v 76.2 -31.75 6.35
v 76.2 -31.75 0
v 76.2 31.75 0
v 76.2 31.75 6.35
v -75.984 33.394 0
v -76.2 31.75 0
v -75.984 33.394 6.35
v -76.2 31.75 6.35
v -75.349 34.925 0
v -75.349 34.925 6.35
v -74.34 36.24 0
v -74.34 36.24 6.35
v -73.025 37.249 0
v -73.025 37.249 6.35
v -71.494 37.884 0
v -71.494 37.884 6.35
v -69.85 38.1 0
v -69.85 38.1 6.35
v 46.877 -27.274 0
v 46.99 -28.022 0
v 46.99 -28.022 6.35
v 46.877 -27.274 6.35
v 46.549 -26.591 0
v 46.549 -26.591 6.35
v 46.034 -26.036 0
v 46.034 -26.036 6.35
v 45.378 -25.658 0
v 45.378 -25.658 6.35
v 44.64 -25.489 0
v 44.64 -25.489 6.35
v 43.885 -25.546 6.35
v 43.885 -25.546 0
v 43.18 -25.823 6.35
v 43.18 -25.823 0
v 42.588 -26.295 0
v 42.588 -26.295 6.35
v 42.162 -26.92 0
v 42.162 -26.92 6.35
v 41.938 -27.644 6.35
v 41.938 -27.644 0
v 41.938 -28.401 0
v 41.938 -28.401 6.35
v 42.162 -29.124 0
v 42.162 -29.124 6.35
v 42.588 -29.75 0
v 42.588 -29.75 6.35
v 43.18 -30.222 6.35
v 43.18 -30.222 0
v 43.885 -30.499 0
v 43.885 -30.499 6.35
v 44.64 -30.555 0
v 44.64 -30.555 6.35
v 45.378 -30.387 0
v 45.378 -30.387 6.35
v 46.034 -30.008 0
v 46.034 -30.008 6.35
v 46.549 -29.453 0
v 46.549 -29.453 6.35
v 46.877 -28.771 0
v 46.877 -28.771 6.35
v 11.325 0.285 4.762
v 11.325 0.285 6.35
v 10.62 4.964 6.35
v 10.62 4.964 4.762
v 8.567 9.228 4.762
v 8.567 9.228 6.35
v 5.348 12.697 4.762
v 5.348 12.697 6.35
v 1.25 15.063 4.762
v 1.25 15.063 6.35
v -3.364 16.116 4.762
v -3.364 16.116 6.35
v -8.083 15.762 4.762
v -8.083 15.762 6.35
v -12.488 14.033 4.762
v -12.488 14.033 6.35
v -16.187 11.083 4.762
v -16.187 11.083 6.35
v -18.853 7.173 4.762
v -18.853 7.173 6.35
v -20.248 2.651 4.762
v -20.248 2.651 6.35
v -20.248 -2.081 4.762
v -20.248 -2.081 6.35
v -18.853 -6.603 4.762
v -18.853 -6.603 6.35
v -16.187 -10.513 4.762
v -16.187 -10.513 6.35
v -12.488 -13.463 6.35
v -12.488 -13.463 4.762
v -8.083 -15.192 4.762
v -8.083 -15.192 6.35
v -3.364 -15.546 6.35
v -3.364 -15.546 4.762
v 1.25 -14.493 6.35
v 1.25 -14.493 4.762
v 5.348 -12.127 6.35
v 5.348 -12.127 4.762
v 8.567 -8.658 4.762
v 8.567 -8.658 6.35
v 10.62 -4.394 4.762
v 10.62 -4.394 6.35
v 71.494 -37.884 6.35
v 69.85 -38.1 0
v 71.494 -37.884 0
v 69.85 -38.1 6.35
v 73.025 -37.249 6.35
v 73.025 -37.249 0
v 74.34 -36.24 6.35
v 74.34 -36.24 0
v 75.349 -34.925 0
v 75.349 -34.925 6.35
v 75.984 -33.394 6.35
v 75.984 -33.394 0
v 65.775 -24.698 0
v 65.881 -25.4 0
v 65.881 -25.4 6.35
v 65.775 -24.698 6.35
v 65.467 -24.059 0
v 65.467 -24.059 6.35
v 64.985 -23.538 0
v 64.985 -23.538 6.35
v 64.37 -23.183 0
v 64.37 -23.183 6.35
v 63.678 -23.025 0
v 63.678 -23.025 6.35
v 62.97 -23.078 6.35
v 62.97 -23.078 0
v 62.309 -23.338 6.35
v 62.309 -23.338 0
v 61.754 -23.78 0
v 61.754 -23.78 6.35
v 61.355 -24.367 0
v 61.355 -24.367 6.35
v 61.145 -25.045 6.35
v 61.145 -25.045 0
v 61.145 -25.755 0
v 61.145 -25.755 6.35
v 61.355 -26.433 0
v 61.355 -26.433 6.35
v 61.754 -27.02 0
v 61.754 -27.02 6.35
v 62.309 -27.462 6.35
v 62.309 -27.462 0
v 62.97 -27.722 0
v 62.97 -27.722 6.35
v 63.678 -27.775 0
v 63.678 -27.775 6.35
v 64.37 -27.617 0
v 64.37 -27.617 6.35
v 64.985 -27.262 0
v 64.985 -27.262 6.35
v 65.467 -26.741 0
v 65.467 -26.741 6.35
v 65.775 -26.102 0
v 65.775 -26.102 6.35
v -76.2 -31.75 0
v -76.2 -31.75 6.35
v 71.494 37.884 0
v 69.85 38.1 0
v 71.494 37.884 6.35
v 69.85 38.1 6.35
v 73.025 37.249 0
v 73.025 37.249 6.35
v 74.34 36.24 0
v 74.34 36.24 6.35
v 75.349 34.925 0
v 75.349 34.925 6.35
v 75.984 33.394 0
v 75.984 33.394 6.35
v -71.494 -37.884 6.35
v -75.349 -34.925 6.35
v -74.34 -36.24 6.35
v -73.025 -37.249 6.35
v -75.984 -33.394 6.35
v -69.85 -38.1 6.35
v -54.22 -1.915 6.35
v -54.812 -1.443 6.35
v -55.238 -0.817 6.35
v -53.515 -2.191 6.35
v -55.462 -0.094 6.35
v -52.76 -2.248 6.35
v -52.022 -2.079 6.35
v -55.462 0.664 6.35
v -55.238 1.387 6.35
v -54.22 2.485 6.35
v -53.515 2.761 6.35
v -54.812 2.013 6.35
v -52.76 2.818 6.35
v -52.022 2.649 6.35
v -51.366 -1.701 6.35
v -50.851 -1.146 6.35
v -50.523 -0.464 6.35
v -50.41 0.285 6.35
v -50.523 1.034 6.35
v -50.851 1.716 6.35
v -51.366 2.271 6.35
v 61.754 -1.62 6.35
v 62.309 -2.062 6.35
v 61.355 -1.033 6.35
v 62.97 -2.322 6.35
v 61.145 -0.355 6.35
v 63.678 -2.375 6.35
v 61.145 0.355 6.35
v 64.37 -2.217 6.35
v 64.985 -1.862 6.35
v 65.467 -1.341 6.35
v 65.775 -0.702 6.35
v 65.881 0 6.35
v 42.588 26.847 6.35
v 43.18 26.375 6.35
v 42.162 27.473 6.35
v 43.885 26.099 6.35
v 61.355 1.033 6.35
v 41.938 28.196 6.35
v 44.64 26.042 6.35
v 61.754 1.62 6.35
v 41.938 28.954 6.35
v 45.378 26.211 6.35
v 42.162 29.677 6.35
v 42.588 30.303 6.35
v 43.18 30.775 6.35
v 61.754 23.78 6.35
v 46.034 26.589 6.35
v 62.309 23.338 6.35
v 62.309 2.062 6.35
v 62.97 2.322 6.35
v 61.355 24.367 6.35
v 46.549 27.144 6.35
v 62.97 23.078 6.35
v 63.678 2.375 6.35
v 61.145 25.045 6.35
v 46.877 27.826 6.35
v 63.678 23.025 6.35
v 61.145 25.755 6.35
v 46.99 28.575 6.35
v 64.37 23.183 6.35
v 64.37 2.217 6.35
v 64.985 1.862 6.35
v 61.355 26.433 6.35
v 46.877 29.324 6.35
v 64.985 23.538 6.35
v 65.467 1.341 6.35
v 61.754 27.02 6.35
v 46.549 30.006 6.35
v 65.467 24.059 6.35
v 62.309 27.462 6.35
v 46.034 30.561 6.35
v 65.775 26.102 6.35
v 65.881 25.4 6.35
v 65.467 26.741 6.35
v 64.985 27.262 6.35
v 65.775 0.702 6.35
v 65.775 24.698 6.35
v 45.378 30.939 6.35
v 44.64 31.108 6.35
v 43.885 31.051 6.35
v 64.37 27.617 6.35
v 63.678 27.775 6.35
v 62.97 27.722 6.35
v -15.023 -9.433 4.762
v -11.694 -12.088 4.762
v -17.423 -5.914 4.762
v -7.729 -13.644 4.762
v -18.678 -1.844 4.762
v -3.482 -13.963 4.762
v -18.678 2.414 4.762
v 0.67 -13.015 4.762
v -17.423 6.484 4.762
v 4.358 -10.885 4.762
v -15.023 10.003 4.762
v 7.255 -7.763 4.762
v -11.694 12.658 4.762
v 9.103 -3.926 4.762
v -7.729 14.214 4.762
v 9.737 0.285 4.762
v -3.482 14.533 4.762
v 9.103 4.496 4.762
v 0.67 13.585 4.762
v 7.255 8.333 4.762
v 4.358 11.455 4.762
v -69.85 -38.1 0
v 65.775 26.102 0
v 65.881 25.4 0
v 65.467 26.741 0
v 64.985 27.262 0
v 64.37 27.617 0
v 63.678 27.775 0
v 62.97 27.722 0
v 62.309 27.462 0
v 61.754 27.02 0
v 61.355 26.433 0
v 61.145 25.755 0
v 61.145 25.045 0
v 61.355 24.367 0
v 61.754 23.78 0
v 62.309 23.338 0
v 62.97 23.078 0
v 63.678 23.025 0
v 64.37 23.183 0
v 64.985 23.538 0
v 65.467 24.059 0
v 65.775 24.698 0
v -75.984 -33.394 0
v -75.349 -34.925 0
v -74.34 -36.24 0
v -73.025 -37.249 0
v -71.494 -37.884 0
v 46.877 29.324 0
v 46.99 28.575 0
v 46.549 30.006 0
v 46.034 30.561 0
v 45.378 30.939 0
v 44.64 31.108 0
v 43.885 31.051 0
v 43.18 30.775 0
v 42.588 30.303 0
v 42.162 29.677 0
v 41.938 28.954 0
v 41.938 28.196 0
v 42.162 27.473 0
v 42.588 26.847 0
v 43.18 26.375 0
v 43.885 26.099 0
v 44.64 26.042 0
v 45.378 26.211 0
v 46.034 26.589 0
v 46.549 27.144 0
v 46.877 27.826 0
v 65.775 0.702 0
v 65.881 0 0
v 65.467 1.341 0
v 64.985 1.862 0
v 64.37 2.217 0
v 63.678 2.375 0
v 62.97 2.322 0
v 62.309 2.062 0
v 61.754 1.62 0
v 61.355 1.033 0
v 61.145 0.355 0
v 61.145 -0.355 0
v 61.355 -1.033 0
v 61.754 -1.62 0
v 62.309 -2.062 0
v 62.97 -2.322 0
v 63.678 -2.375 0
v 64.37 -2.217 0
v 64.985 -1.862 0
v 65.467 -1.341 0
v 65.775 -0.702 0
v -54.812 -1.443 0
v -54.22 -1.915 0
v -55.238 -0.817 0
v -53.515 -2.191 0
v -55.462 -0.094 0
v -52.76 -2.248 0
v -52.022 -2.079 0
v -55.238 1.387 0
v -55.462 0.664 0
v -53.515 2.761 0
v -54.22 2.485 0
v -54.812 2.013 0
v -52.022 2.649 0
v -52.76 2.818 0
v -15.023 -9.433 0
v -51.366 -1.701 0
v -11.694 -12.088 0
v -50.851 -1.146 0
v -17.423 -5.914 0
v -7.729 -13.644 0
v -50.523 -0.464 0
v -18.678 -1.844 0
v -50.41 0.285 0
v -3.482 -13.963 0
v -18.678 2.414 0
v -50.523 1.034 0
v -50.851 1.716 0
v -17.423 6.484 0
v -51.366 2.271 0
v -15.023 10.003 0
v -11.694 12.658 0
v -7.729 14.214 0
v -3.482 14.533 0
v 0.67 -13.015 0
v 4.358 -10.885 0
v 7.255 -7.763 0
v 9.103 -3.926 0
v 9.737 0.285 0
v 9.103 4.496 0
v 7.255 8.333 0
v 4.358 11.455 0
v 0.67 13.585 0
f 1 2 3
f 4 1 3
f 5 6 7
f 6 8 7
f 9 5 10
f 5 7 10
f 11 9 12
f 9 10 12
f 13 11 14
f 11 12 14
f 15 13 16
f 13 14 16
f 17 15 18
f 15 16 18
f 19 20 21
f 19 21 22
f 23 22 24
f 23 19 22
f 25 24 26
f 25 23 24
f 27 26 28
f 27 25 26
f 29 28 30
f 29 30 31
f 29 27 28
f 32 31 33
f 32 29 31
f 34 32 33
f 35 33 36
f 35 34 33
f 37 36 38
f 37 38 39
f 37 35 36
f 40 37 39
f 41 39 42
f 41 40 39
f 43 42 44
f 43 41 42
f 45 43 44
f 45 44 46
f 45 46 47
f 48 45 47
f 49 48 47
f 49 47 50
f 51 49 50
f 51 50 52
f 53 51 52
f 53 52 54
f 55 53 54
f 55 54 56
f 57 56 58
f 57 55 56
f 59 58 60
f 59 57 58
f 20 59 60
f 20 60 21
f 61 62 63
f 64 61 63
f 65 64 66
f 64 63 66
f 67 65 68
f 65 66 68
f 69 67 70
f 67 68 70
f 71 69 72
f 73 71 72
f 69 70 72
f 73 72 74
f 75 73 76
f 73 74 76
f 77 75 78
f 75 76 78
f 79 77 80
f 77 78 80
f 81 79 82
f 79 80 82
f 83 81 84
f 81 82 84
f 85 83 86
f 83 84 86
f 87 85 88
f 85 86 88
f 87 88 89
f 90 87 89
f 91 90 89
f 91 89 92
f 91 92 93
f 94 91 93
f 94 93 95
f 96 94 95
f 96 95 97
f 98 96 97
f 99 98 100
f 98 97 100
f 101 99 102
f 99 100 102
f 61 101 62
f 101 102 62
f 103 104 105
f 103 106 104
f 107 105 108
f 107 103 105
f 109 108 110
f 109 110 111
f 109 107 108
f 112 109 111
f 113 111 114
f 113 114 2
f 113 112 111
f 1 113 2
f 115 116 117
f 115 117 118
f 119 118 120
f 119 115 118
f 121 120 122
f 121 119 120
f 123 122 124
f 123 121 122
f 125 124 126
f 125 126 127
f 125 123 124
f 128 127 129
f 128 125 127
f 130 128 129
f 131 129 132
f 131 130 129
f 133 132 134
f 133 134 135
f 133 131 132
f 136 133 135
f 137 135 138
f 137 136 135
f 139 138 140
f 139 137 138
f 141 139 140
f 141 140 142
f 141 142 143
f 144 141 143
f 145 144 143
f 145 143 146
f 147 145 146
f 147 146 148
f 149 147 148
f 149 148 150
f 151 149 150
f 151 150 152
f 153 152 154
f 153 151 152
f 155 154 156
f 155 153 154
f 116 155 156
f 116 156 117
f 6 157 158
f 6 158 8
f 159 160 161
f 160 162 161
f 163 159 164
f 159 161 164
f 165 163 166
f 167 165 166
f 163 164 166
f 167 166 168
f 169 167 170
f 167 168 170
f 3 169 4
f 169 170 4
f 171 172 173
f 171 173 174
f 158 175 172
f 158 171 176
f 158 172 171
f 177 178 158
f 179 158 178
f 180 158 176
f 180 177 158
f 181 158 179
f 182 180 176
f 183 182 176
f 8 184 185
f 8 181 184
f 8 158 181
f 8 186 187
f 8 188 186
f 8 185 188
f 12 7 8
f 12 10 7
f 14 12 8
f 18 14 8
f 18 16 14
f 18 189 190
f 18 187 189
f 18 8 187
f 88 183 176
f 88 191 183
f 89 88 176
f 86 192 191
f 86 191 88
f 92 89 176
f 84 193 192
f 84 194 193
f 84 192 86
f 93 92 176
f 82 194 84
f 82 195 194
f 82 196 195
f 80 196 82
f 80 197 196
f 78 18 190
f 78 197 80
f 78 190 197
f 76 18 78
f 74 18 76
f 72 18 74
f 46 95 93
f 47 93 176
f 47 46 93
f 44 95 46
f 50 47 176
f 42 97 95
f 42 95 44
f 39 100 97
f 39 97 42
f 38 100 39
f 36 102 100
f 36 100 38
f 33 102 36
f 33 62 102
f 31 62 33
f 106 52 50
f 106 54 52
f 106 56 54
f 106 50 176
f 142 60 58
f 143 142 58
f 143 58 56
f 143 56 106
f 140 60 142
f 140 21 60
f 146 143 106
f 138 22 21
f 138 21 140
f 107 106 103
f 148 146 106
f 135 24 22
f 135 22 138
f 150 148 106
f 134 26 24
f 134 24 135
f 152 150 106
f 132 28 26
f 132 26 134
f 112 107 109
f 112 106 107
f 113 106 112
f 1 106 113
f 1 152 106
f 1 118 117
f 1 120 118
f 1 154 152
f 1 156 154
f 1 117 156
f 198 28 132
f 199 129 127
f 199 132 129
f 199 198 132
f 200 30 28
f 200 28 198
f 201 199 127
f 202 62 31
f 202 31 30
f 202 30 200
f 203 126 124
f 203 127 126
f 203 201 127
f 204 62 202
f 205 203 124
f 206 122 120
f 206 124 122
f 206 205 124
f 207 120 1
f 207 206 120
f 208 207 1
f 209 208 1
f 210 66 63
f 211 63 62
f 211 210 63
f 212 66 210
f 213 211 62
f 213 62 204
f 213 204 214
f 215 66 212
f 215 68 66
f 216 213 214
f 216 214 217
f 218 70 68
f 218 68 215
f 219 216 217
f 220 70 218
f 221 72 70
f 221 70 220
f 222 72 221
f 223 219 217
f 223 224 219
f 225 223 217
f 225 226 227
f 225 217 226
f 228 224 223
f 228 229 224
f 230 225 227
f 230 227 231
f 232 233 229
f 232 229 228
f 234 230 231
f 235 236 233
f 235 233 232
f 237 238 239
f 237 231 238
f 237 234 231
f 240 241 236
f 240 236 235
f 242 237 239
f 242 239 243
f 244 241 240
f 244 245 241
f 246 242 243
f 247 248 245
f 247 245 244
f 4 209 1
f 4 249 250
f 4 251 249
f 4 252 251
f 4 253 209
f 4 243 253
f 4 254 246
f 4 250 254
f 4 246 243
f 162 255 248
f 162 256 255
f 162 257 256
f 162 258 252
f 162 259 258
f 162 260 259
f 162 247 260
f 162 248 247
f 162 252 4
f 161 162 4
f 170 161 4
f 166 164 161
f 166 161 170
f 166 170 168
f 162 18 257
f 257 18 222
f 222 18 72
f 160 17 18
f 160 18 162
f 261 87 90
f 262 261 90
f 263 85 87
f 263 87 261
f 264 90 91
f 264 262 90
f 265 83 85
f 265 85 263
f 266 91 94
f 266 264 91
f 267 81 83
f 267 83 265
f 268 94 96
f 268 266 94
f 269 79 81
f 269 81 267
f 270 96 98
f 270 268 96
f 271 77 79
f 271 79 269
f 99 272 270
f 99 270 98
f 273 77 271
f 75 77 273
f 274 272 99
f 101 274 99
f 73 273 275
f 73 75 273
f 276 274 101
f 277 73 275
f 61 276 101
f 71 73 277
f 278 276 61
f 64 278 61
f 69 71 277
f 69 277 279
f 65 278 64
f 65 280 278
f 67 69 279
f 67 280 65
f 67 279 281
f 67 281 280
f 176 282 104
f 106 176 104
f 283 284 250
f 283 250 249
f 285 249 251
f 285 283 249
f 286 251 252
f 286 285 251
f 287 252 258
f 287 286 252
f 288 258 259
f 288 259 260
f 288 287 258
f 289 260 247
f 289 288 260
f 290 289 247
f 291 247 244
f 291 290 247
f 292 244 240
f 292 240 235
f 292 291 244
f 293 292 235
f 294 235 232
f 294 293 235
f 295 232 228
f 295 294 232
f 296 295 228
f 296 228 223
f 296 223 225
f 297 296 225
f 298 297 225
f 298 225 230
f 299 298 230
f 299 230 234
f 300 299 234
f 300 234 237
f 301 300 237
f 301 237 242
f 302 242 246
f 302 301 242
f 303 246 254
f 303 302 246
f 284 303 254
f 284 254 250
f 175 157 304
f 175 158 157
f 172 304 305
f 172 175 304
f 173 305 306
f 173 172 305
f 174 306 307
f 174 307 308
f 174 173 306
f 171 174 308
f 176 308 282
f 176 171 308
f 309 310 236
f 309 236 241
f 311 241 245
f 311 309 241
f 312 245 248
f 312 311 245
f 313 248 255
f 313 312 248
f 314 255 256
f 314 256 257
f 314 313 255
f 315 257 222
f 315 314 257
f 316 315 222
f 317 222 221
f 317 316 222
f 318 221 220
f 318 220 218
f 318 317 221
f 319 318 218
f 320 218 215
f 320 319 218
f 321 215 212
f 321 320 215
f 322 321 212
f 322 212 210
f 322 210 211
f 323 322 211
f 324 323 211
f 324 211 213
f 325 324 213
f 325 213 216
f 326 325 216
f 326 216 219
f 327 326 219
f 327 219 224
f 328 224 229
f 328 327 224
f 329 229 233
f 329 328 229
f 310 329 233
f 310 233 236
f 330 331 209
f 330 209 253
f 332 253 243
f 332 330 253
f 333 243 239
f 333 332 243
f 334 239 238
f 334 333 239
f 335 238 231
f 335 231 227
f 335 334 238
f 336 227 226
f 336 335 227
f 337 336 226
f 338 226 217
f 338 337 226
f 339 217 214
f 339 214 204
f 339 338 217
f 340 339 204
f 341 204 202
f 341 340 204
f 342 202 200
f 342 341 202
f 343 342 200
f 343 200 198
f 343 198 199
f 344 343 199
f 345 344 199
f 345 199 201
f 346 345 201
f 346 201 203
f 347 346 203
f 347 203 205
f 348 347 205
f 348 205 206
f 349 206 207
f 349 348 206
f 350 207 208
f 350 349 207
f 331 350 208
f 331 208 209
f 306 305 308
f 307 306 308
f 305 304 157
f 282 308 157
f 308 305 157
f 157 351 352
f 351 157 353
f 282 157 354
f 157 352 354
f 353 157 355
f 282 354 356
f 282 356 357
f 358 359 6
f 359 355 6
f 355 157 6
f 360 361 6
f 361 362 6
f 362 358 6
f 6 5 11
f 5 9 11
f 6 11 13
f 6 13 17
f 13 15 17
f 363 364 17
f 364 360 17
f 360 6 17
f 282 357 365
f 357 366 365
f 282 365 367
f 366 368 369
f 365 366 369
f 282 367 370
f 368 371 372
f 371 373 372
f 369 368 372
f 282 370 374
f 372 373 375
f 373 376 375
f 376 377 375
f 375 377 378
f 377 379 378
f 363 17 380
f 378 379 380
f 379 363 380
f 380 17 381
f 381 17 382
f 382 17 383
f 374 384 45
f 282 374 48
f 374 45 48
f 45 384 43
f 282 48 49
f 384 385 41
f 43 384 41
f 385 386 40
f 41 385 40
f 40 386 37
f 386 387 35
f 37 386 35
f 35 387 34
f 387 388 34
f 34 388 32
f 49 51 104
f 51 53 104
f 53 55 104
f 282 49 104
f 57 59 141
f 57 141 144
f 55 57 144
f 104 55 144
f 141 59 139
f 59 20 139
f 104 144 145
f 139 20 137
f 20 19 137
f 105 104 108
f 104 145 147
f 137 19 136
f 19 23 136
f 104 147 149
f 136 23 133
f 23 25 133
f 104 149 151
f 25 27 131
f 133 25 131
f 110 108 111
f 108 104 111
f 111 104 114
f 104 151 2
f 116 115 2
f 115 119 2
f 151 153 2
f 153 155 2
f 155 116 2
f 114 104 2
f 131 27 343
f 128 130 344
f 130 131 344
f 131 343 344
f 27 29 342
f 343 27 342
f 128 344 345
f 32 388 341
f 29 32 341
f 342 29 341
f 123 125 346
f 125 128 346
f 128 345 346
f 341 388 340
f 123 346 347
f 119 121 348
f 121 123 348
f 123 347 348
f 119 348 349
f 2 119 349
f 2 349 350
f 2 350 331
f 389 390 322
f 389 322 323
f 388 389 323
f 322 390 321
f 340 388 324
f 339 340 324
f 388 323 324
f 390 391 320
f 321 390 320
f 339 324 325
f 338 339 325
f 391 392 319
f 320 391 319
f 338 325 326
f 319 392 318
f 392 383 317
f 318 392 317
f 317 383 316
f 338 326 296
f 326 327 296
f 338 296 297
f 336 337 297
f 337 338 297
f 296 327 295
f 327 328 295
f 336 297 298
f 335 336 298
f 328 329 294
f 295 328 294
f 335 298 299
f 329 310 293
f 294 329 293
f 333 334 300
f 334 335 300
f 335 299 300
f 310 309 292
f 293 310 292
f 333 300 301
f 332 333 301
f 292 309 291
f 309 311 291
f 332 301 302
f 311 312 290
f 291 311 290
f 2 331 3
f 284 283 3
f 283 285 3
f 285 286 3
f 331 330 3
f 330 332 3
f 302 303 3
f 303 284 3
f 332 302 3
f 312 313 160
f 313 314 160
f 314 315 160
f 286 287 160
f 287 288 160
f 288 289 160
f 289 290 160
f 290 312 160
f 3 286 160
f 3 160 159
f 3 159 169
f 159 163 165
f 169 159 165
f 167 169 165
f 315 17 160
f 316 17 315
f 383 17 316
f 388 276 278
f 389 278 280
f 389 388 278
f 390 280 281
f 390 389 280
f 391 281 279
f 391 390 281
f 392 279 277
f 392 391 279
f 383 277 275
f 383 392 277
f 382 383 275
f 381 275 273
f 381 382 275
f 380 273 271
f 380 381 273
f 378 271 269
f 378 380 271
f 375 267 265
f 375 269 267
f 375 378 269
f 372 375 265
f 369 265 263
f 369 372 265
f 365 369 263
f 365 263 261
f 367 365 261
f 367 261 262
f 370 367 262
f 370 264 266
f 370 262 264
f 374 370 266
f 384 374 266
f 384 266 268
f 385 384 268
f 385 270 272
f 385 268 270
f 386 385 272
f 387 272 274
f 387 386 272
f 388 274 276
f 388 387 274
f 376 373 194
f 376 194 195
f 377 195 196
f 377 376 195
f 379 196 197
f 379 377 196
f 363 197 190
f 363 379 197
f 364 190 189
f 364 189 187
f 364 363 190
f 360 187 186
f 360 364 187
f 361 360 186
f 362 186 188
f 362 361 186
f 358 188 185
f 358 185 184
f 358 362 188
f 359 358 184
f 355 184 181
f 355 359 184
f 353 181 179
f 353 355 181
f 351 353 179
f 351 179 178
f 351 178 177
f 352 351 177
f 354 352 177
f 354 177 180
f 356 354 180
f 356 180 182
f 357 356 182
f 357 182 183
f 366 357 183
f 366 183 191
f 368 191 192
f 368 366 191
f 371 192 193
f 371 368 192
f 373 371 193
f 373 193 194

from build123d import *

# Parameters (mm, degrees)
SKETCH1_W           = 152.4
SKETCH1_H           = 76.2
SKETCH1_R           = 2.54
SKETCH1_R_2         = 2.38125
SKETCH1_R_3         = 14.2875
BOSS_EXTRUDE1_DEPTH = 6.35
FILLET1_R           = 6.35
SKETCH2_R           = 15.875
CUT_EXTRUDE1_DEPTH  = 1.5875


with BuildPart() as part:
    # Sketch1 → Boss-Extrude1 (new body)
    with BuildSketch(Plane.XY):
        Rectangle(SKETCH1_W, SKETCH1_H)
        with Locations((44.45, 28.575)):
            Circle(SKETCH1_R, mode=Mode.SUBTRACT)
        with Locations((44.45, -28.022317844)):
            Circle(SKETCH1_R, mode=Mode.SUBTRACT)
        with Locations((63.5, 25.4)):
            Circle(SKETCH1_R_2, mode=Mode.SUBTRACT)
        with Locations((63.5, 0)):
            Circle(SKETCH1_R_2, mode=Mode.SUBTRACT)
        with Locations((63.5, -25.4)):
            Circle(SKETCH1_R_2, mode=Mode.SUBTRACT)
        with Locations((-4.550000044, 0.284999938)):
            Circle(SKETCH1_R_3, mode=Mode.SUBTRACT)
        with Locations((-52.950000018, 0.284999938)):
            Circle(SKETCH1_R, mode=Mode.SUBTRACT)
    extrude(amount=BOSS_EXTRUDE1_DEPTH)

    # Fillet1
    fillet1_edges = [part.edges().sort_by_distance(p)[0] for p in [
        (76.2, -38.1, 3.175),
        (-76.2, -38.1, 3.175),
        (-76.2, 38.1, 3.175),
        (76.2, 38.1, 3.175),
    ]]
    fillet(fillet1_edges, radius=FILLET1_R)

    # Sketch2 → Cut-Extrude1 (cut)
    with BuildSketch(Plane.XY.offset(6.35)):
        with Locations((-4.550000044, 0.284999938)):
            Circle(SKETCH2_R)
    extrude(amount=-CUT_EXTRUDE1_DEPTH, mode=Mode.SUBTRACT)


solid = part.part
